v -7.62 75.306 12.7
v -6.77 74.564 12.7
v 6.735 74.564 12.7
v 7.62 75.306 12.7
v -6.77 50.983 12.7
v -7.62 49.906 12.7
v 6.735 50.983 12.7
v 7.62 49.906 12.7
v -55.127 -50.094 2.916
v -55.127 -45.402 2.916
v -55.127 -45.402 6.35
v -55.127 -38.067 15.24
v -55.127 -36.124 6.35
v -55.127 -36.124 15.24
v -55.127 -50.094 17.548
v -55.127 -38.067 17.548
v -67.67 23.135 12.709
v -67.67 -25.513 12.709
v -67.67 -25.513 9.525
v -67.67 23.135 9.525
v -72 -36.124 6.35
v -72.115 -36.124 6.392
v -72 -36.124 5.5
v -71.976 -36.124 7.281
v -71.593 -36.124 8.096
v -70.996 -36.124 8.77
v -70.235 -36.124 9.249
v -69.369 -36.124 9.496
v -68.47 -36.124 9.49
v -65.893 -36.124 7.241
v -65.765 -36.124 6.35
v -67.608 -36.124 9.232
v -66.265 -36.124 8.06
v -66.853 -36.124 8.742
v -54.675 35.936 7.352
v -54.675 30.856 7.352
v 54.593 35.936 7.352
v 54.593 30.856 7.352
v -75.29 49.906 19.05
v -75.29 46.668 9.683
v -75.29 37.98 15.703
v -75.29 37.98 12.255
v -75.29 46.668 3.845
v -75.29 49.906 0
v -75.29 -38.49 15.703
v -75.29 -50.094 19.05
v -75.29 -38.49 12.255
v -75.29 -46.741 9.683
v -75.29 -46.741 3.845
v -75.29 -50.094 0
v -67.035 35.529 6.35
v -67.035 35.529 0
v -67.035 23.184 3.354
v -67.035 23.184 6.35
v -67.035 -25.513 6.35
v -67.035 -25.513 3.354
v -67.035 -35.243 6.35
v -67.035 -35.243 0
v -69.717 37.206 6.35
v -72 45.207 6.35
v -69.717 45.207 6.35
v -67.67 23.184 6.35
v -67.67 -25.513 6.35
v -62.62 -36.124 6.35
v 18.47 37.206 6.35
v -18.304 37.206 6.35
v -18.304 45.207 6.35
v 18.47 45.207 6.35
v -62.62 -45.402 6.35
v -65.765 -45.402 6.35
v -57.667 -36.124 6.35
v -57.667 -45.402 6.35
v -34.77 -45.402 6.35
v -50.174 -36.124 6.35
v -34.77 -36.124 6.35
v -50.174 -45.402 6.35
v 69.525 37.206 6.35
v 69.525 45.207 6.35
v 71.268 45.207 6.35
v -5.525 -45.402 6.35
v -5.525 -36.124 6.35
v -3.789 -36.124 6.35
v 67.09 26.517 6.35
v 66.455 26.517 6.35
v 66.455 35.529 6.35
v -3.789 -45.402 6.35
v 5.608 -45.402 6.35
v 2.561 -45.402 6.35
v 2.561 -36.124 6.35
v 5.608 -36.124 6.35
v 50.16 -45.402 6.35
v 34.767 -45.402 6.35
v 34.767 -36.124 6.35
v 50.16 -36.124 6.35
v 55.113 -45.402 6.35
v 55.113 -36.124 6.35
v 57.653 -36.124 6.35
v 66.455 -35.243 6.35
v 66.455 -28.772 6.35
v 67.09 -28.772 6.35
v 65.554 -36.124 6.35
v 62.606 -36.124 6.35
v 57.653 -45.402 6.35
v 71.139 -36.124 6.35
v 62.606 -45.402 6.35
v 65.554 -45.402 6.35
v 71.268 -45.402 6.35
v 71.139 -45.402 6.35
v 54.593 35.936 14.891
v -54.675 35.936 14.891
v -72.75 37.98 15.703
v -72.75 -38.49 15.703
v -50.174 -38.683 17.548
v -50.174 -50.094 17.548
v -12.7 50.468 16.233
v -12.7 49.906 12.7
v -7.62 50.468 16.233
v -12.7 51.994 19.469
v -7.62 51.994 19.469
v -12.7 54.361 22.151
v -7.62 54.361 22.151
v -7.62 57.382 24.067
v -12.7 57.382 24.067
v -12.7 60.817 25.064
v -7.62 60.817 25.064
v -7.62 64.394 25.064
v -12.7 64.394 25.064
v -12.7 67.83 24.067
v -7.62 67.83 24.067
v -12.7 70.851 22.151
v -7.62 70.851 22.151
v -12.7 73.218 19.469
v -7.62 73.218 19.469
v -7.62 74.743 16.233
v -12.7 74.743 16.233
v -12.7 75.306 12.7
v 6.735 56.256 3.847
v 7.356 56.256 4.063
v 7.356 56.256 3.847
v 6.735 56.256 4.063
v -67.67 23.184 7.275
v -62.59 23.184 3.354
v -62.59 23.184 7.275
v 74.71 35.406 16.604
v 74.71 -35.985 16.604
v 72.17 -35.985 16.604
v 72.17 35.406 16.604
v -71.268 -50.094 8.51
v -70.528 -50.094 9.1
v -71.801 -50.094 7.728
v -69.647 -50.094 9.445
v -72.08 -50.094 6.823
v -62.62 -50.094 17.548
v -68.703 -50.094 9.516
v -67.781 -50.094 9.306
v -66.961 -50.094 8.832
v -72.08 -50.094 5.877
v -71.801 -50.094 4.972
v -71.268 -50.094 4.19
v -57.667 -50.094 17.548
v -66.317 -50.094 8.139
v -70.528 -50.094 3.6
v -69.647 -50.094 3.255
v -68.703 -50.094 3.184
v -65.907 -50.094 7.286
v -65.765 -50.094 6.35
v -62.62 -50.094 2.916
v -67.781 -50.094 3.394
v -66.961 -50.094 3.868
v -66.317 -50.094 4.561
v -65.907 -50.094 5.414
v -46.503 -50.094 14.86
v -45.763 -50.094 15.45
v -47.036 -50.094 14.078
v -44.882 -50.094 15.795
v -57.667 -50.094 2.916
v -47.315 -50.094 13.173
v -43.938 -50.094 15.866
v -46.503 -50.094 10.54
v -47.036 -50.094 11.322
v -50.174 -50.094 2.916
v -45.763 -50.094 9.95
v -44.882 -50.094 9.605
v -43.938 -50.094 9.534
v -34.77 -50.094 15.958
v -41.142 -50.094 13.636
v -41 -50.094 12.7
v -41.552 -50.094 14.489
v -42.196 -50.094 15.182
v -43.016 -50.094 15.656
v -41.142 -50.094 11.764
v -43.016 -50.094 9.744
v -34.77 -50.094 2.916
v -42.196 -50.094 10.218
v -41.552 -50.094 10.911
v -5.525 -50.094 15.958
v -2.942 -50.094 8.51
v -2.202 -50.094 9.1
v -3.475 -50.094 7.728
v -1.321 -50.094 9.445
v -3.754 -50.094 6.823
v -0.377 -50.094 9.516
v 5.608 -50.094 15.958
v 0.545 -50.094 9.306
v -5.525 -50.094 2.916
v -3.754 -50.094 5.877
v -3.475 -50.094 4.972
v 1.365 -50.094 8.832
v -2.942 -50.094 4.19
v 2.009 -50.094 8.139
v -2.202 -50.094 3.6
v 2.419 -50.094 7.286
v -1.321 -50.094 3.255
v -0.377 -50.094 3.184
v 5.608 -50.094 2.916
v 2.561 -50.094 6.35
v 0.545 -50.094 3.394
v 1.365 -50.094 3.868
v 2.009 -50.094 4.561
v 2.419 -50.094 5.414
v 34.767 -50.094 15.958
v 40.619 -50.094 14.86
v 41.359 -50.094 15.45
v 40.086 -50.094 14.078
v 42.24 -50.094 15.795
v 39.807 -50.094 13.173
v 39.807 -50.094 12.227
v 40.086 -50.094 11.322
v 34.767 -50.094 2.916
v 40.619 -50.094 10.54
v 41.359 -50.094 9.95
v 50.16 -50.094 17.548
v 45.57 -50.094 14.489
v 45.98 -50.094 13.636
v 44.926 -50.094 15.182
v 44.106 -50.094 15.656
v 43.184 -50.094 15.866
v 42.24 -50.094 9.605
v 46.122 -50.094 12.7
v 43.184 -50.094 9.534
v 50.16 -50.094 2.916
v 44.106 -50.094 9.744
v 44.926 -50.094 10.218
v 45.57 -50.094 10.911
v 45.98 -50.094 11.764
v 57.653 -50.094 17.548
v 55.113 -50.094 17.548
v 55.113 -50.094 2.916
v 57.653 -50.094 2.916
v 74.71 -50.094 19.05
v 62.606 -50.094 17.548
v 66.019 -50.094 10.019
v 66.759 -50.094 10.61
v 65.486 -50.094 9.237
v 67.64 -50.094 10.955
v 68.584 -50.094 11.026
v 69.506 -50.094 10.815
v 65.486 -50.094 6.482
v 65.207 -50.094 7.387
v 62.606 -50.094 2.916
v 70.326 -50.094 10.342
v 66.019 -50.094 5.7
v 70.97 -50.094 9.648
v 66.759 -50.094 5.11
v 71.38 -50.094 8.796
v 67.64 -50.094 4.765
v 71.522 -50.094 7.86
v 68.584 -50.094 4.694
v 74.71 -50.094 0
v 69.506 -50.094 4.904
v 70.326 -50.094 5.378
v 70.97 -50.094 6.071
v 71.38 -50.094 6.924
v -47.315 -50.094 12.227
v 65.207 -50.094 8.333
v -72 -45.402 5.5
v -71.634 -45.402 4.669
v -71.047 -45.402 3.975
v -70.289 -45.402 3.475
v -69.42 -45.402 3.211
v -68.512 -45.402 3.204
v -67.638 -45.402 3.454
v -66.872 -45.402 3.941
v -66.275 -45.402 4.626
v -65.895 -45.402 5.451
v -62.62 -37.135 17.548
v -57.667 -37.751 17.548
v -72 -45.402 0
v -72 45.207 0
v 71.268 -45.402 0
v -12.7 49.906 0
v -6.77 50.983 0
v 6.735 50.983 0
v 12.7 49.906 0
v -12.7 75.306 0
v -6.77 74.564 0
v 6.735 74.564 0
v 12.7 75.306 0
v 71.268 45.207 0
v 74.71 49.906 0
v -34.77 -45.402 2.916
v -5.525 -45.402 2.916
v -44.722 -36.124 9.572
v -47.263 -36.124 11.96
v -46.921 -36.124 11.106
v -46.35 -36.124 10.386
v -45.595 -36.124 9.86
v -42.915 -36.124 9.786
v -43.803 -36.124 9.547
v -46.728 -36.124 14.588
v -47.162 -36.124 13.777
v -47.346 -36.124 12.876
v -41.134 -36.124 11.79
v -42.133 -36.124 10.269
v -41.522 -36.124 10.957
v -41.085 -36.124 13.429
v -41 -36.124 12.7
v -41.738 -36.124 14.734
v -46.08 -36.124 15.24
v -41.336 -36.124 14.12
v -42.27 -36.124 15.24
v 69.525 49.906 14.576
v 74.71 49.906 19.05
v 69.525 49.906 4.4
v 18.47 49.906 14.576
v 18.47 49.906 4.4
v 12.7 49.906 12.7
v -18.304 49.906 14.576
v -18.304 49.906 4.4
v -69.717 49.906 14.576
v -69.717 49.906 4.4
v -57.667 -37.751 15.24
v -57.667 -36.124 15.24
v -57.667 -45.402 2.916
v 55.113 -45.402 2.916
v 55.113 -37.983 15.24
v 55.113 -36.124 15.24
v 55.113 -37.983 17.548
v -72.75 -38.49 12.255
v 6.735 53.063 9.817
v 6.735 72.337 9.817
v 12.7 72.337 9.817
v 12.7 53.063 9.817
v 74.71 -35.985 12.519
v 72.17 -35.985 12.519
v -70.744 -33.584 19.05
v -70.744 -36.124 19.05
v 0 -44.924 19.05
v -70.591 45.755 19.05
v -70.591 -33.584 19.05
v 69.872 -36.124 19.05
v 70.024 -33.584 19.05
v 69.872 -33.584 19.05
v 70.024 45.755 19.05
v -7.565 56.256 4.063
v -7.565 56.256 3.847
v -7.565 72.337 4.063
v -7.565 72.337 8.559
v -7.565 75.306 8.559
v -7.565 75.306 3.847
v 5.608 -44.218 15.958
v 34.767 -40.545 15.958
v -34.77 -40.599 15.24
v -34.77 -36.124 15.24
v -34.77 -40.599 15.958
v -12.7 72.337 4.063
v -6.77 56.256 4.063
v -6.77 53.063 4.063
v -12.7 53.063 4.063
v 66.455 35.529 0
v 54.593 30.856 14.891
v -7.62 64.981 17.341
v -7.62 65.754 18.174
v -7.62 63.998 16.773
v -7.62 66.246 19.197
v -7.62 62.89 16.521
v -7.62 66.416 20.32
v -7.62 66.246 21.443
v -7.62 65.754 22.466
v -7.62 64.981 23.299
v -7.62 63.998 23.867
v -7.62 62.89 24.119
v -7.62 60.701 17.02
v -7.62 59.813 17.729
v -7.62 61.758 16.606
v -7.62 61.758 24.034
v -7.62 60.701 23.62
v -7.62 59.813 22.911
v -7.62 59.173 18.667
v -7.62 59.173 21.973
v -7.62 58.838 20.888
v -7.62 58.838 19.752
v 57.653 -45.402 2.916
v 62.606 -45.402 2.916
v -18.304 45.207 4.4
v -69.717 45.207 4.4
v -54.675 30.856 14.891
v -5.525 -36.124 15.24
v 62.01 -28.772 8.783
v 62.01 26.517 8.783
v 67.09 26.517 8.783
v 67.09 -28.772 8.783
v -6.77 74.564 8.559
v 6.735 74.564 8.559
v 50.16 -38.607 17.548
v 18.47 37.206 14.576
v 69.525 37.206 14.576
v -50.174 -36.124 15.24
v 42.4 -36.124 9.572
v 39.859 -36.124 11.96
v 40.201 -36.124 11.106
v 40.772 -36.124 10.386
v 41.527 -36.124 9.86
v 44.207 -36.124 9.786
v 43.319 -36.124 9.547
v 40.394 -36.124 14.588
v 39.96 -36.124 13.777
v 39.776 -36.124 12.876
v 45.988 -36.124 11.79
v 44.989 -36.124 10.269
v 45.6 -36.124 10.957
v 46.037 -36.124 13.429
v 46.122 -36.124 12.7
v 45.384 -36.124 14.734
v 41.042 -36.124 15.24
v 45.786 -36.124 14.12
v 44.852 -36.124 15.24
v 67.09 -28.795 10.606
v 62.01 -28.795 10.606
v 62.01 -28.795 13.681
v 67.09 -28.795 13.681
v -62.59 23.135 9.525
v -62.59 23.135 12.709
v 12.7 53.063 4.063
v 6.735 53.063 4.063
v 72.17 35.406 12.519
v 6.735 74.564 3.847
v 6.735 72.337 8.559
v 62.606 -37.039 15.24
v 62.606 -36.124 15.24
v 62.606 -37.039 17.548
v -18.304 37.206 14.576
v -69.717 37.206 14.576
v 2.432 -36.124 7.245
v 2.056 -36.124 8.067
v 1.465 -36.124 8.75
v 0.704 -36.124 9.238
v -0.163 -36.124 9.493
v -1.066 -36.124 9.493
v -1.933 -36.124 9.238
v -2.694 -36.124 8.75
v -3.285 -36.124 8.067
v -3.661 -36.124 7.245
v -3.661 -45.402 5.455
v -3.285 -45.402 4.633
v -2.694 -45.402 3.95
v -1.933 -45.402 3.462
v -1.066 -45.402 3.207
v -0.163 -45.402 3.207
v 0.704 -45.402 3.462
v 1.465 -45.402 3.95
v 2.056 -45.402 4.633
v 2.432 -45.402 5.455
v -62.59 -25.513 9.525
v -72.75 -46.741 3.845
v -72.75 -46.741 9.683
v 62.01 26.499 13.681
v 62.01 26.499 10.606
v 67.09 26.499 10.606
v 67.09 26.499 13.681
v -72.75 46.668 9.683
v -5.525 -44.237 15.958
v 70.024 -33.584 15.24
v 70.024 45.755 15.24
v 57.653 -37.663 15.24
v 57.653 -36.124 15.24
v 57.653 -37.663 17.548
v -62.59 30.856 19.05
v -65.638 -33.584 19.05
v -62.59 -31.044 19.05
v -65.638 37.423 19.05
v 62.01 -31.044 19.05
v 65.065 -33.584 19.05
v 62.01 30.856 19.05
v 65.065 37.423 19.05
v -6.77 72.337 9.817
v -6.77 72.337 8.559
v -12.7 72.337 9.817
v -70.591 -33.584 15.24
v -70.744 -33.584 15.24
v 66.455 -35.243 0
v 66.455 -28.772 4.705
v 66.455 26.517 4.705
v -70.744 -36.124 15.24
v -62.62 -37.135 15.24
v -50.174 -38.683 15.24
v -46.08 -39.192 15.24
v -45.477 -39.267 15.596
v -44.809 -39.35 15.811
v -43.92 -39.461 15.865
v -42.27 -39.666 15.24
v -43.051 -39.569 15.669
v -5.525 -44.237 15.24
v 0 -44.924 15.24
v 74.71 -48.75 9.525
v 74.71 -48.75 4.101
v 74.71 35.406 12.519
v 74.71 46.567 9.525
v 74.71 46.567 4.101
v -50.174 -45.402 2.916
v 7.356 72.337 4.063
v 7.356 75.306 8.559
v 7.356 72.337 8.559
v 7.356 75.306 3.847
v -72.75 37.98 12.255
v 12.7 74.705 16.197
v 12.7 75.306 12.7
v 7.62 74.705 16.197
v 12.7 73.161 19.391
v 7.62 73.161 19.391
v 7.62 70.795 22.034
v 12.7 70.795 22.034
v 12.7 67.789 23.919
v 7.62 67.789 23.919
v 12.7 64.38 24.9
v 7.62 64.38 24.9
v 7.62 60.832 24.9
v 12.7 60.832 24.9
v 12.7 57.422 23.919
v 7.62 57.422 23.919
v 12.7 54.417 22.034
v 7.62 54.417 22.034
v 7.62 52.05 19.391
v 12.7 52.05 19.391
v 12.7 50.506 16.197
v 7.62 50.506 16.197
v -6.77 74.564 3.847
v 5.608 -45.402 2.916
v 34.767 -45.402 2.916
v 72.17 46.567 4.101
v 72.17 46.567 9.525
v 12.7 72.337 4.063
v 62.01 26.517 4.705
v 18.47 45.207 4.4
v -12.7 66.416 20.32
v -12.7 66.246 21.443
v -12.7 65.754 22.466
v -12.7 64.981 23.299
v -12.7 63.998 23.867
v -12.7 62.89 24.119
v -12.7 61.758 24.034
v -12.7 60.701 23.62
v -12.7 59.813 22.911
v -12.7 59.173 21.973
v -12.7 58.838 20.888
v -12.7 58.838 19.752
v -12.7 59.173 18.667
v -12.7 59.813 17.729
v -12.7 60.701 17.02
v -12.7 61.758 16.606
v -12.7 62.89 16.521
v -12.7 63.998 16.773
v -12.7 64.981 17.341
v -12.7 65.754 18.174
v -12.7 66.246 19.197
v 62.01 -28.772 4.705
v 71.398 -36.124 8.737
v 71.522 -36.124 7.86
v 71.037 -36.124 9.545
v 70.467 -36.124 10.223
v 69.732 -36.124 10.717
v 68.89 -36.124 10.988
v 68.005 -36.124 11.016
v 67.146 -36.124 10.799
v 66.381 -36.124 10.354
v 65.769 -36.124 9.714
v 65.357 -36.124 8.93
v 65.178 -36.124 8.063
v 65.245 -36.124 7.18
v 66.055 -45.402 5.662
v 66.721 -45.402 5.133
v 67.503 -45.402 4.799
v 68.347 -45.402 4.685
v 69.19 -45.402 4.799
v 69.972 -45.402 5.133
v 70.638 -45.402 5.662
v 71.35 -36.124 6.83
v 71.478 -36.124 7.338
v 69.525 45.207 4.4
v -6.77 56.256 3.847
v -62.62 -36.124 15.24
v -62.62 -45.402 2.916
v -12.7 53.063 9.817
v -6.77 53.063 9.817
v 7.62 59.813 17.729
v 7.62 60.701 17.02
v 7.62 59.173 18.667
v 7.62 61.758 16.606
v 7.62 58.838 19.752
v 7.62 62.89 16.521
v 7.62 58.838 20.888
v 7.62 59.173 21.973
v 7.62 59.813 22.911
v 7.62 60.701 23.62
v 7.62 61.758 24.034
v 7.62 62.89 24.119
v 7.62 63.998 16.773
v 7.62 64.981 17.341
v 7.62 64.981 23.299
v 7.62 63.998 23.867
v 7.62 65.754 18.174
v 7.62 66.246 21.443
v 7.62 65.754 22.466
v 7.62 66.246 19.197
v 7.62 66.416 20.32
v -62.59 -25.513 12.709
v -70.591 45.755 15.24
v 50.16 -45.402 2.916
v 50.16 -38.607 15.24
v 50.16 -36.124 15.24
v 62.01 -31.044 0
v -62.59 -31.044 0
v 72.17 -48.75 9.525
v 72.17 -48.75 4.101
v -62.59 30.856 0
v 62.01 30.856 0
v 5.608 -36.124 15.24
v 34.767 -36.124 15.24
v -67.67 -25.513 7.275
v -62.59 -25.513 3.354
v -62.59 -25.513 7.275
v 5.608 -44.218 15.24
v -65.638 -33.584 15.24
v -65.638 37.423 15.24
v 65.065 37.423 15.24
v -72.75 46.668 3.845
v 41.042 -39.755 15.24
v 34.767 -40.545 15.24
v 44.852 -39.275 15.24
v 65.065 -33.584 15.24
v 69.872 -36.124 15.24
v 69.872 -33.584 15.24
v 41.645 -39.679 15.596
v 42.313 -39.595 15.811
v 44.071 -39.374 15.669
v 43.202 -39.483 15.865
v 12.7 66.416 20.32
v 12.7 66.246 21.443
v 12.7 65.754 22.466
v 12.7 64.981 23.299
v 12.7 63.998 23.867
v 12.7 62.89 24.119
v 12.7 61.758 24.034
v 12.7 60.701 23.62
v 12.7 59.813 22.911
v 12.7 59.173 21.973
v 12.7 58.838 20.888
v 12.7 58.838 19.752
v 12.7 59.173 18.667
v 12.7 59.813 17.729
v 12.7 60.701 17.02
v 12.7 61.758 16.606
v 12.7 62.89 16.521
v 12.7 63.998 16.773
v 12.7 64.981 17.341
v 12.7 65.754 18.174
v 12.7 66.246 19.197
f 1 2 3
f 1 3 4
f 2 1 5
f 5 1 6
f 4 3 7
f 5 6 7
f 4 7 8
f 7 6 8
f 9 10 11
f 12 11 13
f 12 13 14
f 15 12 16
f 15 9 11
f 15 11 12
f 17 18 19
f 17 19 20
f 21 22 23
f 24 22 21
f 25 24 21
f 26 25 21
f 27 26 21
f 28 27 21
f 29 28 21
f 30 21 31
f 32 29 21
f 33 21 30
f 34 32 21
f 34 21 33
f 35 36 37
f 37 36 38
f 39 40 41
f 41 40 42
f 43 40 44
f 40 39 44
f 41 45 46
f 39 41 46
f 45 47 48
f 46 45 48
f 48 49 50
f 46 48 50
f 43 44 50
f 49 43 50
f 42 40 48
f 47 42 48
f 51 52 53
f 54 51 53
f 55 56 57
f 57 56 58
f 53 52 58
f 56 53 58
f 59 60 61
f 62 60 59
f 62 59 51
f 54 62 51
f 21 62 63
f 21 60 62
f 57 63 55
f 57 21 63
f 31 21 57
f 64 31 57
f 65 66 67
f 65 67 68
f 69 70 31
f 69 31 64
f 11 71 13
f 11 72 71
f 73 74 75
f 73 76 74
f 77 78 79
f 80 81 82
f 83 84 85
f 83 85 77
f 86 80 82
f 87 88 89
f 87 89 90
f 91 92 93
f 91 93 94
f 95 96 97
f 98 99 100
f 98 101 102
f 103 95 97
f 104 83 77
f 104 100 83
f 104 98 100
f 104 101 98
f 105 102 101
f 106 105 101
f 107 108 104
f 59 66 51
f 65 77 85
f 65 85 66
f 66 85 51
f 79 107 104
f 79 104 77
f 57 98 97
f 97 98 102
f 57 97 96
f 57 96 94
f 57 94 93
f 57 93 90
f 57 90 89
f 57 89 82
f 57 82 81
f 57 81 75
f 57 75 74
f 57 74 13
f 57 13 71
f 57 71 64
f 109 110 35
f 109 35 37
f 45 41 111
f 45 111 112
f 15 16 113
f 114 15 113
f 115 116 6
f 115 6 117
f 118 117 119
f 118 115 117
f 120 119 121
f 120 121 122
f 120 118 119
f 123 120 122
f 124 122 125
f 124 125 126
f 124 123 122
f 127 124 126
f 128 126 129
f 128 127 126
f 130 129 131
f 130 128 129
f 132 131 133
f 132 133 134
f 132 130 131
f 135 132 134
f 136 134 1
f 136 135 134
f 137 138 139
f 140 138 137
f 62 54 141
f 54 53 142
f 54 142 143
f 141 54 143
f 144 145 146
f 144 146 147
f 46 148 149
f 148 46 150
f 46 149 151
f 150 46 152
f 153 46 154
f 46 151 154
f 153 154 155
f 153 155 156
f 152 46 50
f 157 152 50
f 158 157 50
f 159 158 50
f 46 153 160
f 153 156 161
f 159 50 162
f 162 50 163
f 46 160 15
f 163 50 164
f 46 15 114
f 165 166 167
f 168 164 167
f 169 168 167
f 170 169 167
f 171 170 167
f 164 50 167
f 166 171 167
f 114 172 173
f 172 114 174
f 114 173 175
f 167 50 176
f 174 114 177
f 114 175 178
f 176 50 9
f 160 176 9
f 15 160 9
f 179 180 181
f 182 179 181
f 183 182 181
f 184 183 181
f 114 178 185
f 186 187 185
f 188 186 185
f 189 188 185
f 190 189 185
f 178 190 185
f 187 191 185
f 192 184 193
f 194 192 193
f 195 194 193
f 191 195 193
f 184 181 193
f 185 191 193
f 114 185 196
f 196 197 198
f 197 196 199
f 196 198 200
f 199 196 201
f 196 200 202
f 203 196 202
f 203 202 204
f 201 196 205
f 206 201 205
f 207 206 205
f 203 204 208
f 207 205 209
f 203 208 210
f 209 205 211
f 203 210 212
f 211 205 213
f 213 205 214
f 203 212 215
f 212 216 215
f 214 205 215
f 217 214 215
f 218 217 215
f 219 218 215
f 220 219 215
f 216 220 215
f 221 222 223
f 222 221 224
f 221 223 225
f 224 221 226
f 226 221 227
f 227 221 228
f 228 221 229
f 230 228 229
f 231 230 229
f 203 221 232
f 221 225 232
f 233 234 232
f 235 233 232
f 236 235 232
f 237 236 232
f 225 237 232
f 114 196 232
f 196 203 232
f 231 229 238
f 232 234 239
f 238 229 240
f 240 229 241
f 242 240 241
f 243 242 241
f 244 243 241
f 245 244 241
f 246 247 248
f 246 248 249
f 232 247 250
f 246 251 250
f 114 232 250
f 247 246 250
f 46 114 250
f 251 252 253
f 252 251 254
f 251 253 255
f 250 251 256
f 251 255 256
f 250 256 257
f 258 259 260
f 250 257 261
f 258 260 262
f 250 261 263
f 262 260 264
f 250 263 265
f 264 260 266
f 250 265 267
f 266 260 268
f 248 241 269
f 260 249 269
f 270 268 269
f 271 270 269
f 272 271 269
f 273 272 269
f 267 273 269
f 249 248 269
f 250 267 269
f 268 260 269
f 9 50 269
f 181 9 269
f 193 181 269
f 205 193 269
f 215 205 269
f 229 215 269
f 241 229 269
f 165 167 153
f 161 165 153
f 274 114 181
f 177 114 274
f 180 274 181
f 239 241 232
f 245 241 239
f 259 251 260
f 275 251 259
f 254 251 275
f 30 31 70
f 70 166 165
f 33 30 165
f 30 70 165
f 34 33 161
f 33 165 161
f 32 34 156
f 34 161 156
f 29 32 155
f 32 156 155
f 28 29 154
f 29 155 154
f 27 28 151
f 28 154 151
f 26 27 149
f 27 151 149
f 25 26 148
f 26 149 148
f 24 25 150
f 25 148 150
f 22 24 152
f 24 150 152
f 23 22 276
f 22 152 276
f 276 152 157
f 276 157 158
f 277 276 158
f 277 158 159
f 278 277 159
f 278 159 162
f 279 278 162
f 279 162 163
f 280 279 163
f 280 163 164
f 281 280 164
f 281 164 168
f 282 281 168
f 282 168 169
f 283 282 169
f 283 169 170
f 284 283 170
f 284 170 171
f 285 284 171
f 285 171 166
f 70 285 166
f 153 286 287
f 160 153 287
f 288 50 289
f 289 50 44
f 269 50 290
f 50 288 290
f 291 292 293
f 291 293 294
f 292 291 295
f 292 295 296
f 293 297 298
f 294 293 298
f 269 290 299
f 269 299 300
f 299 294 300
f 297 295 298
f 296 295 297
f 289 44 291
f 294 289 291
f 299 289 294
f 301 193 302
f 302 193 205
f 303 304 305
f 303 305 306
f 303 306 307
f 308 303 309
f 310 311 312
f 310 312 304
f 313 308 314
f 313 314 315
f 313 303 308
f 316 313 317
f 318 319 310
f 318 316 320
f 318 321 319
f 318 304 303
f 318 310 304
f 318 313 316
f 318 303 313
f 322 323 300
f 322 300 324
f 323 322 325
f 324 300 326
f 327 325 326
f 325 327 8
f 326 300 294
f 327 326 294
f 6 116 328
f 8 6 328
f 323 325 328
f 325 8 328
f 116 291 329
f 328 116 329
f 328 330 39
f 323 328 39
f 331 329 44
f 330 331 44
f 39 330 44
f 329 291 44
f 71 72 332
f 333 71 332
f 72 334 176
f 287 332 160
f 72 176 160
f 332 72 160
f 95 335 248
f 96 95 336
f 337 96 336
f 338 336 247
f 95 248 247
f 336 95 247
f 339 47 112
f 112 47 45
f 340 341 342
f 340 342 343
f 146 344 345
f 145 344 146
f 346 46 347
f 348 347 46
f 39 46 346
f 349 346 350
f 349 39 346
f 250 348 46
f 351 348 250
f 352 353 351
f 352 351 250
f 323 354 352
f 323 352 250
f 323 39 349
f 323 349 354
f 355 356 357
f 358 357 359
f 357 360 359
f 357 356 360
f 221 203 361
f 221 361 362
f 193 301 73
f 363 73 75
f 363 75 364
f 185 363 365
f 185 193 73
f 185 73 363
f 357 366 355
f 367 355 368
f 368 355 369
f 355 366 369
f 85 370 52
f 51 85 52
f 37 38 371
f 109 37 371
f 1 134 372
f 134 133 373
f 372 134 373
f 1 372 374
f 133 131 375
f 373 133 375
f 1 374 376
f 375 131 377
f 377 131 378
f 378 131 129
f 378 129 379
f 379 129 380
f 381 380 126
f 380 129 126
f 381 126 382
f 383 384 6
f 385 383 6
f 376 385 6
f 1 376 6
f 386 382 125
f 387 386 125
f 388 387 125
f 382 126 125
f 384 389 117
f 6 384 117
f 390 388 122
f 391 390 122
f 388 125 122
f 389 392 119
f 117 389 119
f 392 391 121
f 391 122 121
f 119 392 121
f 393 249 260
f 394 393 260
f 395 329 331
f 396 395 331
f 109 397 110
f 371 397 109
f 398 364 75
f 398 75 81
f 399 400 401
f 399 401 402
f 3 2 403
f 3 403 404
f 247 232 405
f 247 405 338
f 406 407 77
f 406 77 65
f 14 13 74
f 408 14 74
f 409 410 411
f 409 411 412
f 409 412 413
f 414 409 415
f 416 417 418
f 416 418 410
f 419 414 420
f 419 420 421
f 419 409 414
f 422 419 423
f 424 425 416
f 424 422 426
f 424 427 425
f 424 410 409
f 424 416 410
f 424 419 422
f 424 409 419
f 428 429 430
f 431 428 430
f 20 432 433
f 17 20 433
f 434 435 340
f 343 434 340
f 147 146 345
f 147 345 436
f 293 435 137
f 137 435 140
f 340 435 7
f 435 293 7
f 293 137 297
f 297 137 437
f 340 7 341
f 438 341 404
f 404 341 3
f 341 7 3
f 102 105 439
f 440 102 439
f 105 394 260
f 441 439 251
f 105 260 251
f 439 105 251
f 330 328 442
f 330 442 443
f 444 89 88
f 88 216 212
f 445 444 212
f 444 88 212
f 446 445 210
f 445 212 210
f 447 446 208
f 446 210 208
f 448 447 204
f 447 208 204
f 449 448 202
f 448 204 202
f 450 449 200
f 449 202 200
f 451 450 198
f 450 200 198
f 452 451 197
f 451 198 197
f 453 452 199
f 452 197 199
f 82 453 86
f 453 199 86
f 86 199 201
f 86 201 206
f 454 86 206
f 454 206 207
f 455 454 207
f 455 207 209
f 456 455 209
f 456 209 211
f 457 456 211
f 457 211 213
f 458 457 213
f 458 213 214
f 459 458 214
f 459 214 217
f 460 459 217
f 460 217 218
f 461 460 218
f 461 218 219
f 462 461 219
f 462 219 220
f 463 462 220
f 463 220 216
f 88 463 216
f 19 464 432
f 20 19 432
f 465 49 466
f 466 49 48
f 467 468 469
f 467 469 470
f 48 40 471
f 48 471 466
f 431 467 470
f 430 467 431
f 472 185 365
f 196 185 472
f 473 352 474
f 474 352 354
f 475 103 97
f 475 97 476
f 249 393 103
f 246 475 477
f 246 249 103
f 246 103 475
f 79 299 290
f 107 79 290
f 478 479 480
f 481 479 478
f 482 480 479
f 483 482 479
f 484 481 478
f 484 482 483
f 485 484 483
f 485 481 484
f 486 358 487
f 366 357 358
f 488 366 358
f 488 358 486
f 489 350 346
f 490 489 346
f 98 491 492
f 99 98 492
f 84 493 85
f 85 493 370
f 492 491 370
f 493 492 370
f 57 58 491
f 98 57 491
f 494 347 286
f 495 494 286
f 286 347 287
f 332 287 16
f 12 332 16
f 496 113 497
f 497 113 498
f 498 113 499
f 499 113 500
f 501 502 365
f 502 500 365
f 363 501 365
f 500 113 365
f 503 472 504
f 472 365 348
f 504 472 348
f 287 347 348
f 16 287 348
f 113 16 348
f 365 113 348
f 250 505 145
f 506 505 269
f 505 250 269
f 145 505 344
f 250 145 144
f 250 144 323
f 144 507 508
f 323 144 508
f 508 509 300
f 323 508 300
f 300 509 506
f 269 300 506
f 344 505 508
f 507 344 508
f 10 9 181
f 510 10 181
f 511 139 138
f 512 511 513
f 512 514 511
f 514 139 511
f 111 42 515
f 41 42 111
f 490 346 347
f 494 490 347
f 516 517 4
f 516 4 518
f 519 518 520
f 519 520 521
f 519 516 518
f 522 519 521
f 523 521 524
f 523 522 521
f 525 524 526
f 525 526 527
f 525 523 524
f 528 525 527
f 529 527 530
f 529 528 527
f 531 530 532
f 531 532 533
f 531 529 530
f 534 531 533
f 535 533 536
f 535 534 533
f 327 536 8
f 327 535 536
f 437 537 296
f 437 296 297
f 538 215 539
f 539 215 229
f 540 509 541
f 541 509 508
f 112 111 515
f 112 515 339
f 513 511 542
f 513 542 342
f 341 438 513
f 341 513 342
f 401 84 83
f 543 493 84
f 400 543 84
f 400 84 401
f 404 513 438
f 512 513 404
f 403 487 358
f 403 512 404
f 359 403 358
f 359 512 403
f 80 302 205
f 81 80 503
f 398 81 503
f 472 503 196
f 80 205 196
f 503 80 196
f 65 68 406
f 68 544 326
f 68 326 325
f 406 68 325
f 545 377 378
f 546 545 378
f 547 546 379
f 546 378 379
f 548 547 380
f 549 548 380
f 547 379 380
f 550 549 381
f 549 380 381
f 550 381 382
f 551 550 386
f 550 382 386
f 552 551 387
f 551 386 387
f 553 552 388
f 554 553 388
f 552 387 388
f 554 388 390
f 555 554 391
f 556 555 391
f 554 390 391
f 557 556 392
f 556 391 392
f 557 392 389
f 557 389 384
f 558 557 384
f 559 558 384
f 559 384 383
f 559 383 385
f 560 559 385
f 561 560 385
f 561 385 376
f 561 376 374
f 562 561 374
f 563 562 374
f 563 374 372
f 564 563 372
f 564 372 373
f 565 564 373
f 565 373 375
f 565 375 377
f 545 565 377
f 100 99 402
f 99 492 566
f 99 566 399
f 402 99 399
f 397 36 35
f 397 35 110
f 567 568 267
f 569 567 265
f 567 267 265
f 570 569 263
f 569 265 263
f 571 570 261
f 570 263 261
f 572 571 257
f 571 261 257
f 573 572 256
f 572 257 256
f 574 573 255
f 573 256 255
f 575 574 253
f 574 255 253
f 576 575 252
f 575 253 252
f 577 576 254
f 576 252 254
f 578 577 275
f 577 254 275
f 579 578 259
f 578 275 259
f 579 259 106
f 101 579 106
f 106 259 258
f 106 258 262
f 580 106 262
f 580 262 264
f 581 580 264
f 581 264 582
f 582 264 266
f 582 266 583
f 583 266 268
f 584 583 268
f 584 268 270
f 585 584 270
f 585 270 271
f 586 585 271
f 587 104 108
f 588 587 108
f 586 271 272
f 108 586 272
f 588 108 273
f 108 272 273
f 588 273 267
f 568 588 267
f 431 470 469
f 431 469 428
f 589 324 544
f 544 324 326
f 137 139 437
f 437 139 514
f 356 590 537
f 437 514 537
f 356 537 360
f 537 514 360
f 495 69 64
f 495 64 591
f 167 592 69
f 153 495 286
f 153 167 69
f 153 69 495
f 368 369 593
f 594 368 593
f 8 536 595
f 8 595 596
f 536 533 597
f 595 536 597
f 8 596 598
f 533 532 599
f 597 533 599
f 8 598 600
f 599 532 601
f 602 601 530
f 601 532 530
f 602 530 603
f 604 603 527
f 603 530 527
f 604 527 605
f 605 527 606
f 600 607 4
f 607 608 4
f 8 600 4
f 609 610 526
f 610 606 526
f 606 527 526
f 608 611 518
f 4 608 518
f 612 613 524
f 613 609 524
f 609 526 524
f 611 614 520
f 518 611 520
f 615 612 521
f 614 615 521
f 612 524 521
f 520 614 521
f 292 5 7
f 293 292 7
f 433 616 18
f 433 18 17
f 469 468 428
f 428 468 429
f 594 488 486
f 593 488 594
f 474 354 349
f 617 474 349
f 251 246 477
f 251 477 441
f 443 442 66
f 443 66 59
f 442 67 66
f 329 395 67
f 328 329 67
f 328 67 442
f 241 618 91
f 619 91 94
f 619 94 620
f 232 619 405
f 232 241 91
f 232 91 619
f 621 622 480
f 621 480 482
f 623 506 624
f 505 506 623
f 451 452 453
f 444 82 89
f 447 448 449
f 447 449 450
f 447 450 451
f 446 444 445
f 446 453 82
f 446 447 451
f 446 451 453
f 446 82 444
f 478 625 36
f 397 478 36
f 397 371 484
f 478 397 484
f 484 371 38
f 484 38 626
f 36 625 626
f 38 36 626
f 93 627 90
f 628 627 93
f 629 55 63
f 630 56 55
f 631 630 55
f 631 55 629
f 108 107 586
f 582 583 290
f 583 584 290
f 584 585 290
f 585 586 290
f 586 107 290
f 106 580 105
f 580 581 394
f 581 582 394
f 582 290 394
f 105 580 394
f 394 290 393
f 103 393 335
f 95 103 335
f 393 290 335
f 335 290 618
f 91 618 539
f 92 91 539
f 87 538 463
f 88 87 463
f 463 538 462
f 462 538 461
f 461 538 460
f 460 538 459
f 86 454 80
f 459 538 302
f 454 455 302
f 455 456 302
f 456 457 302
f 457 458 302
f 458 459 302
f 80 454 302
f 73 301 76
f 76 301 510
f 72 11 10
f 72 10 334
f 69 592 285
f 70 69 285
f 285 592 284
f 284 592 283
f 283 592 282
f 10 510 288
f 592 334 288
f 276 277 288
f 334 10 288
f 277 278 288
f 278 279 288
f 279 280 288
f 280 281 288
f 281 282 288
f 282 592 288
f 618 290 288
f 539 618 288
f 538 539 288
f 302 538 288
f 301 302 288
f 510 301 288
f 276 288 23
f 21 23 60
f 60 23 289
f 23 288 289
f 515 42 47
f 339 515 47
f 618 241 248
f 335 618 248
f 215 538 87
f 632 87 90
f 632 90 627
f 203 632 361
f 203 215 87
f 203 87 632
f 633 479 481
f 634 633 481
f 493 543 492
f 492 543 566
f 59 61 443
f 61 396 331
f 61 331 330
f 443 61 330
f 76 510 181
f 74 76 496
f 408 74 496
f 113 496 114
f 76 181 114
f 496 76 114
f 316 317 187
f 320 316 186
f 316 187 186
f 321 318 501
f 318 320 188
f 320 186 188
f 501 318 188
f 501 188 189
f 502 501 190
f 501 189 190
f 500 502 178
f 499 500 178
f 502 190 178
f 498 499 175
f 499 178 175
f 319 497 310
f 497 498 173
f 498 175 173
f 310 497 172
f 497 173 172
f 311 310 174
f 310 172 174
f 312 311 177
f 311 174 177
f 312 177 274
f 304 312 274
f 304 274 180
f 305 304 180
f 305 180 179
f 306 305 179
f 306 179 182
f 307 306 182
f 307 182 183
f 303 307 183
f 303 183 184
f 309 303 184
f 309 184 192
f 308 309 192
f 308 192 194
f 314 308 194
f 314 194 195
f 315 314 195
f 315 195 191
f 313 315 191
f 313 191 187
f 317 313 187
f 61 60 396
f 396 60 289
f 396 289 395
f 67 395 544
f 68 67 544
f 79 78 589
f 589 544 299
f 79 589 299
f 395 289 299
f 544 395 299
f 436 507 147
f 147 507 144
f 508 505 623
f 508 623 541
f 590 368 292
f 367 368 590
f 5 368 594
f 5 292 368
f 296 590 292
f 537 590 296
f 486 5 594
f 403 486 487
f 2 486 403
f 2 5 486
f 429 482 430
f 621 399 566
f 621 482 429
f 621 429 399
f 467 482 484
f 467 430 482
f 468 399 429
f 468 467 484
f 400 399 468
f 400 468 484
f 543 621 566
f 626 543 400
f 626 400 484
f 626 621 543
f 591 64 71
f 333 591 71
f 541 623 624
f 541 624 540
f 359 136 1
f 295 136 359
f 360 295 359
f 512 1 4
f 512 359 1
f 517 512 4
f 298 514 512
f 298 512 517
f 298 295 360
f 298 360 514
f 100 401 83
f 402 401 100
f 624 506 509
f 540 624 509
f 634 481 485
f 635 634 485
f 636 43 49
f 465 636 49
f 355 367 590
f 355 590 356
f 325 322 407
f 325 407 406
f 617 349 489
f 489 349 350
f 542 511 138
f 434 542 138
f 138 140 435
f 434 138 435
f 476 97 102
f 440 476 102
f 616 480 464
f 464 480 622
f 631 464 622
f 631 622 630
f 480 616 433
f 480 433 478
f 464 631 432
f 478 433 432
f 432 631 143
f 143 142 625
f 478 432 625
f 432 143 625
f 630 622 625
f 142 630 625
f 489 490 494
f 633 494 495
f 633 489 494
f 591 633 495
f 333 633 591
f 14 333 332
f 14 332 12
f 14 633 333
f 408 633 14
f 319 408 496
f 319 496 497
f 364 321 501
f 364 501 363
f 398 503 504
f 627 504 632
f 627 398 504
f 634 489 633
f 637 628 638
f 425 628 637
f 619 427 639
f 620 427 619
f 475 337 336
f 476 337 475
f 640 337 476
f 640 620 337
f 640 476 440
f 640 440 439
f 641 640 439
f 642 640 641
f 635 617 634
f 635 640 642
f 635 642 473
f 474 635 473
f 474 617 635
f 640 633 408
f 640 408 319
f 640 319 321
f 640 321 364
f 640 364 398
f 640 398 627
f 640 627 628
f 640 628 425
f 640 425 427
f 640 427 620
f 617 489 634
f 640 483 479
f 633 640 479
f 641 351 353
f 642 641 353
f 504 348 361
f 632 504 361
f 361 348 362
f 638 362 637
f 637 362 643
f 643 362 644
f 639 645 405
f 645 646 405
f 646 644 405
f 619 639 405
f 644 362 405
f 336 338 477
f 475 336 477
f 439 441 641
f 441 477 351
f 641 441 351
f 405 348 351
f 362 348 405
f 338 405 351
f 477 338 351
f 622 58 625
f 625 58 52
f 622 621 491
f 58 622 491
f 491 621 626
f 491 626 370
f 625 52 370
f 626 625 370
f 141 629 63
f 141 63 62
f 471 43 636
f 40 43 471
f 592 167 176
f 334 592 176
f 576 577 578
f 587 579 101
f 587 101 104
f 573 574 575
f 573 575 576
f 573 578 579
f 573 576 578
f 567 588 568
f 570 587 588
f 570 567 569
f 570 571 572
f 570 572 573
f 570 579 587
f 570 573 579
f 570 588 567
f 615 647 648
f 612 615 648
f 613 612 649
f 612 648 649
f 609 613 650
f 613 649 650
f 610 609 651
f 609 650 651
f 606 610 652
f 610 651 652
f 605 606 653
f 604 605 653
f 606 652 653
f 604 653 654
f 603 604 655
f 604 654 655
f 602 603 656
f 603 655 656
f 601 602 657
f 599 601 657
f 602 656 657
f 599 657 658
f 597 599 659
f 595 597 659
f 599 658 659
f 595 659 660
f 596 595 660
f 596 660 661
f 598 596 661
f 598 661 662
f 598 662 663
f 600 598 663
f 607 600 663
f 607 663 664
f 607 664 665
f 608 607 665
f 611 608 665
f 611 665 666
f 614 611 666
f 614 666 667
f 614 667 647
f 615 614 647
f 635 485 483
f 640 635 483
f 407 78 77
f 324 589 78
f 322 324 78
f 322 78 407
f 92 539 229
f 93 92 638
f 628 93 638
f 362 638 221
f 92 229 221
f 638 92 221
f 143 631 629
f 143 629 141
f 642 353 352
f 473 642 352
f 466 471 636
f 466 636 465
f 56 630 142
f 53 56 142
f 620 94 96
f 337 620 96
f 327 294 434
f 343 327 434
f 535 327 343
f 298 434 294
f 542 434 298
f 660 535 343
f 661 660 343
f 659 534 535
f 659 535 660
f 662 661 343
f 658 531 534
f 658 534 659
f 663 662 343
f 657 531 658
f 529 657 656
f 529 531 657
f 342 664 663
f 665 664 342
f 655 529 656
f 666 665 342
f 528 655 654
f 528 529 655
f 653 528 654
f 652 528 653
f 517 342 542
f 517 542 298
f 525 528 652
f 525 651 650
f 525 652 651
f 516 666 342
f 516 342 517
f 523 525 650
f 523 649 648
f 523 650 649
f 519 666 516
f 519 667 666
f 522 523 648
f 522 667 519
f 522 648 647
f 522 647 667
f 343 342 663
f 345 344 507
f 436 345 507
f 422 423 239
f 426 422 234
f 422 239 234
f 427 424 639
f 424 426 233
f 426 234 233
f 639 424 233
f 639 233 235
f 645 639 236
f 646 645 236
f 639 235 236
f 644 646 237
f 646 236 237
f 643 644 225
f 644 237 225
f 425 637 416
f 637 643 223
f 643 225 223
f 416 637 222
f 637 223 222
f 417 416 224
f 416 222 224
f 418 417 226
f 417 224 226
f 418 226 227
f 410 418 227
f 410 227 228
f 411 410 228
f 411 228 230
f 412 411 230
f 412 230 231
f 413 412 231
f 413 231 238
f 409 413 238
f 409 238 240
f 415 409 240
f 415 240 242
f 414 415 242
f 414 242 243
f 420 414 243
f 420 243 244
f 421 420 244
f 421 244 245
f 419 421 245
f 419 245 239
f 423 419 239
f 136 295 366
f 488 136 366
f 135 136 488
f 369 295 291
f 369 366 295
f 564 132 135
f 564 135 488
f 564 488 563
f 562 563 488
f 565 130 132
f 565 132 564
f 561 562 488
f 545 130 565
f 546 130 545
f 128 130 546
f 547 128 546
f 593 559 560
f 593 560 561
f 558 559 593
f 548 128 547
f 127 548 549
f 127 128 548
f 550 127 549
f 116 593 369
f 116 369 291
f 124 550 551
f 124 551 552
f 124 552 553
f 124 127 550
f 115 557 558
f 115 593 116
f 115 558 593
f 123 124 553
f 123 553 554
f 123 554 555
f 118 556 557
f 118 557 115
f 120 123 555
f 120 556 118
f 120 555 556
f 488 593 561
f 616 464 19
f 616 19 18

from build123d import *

# Parameters (mm, degrees)
F0_W      = 124.6
F0_H      = 61.9
F1_DEPTH  = 19.05
F2_W      = 4.953
F2_H      = 14.6315630991
F2_W_2    = 29.2449435338
F2_H_2    = 13.041177066
F2_W_3    = 29.159436468
F2_R      = 3.175
F3_DEPTH  = 13.97
F5_DEPTH  = 6.35
F6_W      = 12.7
F6_H      = 25.4
F7_DEPTH  = 12.7
F8_W      = 4.953
F8_H      = 71.0073517896
F9_DEPTH  = 3.81
F10_R     = 3.81
F11_DEPTH = 5.08
F13_DEPTH = 5.08
F14_DEPTH = 31.75
F16_W     = 13.5046280921
F16_H     = 23.5811583698
F17_DEPTH = 25.4
F18_W     = 19.2745104432
F18_H     = 5.7546193711
F19_DEPTH = 31.75
F20_W     = 14.9206416681
F20_H     = 4.7117811628
F21_DEPTH = 19.05
F22_W     = 51.0552711785
F22_H     = 10.1753515191
F22_W_2   = 51.412301138
F23_DEPTH = 12.7
F24_W     = 93.4092327952
F24_H     = 5.8380772825
F24_W_2   = 76.4692127705
F24_H_2   = 3.4473836422
F25_DEPTH = 2.54
F26_W     = 95.3170992434
F26_H     = 5.4240481682
F26_W_2   = 71.3913366199
F26_H_2   = 4.0845796466
F27_DEPTH = 2.54
F28_W     = 109.2679016292
F28_H     = 7.5388159603
F29_DEPTH = 5.08
F30_W     = 48.6481711268
F30_H     = 3.1835205168
F30_W_2   = 48.6969016492
F30_H_2   = 3.9205837529
F31_DEPTH = 5.08
F32_W     = 55.2894864231
F32_H     = 4.0775961243
F32_W_2   = 55.2933309227
F32_H_2   = 3.075633198
F33_DEPTH = 5.08


# Not quite as in the source:
# - a feature names something its author has since deleted; it is built from what else it names


with BuildPart() as f1:
    # F0 (on Top) → F1 (new body)
    with BuildSketch(Plane.XY):
        Polygon((-75.2904937168, 49.9057597088), (-75.2904937168, -50.0942402912), (-42.6597435957, -50.0942402912), (67.6151300783, -50.0942402912), (74.7095062832, -50.0942402912), (74.7095062832, 49.9057597088), (-0.2904937168, 49.9057597088), (-25.810170721, 49.9057597088), (-50.4447113996, 49.9057597088), align=None)
        with Locations((-0.2904937168, -0.0942402912)):
            Rectangle(F0_W, F0_H, mode=Mode.SUBTRACT)
    extrude(amount=F1_DEPTH)

    # F2 (on face) → F3 (cut)
    with BuildSketch(Plane.XZ.offset(50.0942402912)):
        with Locations((-60.1431414232, 10.2322226157)):
            Rectangle(F2_W, F2_H)
        with Locations((-52.6501414232, 10.2322226157)):
            Rectangle(F2_W, F2_H)
        with Locations((-20.147212787, 9.4370295992)):
            Rectangle(F2_W_2, F2_H_2)
        with Locations((20.1876896899, 9.4370295992)):
            Rectangle(F2_W_3, F2_H_2)
        with Locations((52.6363079239, 10.2322226157)):
            Rectangle(F2_W, F2_H)
        with Locations((60.1293079239, 10.2322226157)):
            Rectangle(F2_W, F2_H)
        with Locations((-44.1754937168, 12.7)):
            Circle(F2_R)
        with Locations((-0.6144937168, 6.35)):
            Circle(F2_R)
        with Locations((42.9465062832, 12.7)):
            Circle(F2_R)
        with Locations((68.3465062832, 7.8599134153)):
            Circle(F2_R)
        with Locations((-68.9404937168, 6.35)):
            Circle(F2_R)
    extrude(amount=-F3_DEPTH, mode=Mode.SUBTRACT)

    # F4 (on face) → F5 (cut)
    with BuildSketch(Plane(origin=(0, 0, 0), x_dir=(1, 0, 0), z_dir=(0, 0, -1))):
        Polygon((66.3145062832, 45.4020188174), (-67.0354937168, 45.4020188174), (-67.0354937168, 35.2429834301), (-61.1156715149, 35.2429834301), (60.9613691041, 35.2429834301), (66.3145062832, 35.2429834301), align=None)
        Polygon((-67.0354937168, 35.2429834301), (-67.0354937168, 45.4020188174), (-71.9995722175, 45.4020188174), (-71.9995722175, -45.2067597088), (-67.0354937168, -45.2067597088), (-67.0354937168, -35.52858904), align=None)
        Polygon((71.2675062832, 45.4020188174), (66.3145062832, 45.4020188174), (66.3145062832, 35.2429834301), (66.4545062832, 35.2429834301), (66.4545062832, -35.52858904), (66.4545062832, -45.2067597088), (71.2675062832, -45.2067597088), align=None)
        Polygon((60.9613691041, -35.52858904), (-67.0354937168, -35.52858904), (-67.0354937168, -45.2067597088), (66.4545062832, -45.2067597088), (66.4545062832, -35.52858904), align=None)
    extrude(amount=-F5_DEPTH, mode=Mode.SUBTRACT)

    # F6 (on face) → F7 (join)
    with BuildSketch(Plane(origin=(0, 0, 0), x_dir=(1, 0, 0), z_dir=(0, 0, -1))):
        with Locations((6.35, -62.6057597088)):
            Rectangle(F6_W, F6_H)
        with Locations((-6.35, -62.6057597088)):
            Rectangle(F6_W, F6_H)
    extrude(amount=-F7_DEPTH)

    # F8 (on face) → F9 (cut)
    with BuildSketch(Plane.XY.offset(19.05)):
        Polygon((70.0243711472, 45.754622668), (-70.5914937168, 45.754622668), (-70.5914937168, 37.4231114984), (-65.6384937168, 37.4231114984), (65.065138042, 37.4231114984), (70.0243711472, 37.4231114984), align=None)
        with Locations((-68.1149937168, 1.9194356036)):
            Rectangle(F8_W, F8_H)
        Polygon((70.0243711472, -33.5842402912), (70.0243711472, 37.4231114984), (65.065138042, 37.4231114984), (65.065138042, -33.5842402912), (69.871573916, -33.5842402912), align=None)
        Polygon((-65.6384937168, -33.5842402912), (-70.5914937168, -33.5842402912), (-70.7442909479, -33.5842402912), (-70.7442909479, -36.1242402912), (69.871573916, -36.1242402912), (69.871573916, -33.5842402912), (65.065138042, -33.5842402912), align=None)
        Polygon((69.871573916, -36.1242402912), (-70.7442909479, -36.1242402912), (0, -44.9241176248), align=None)
    extrude(amount=-F9_DEPTH, mode=Mode.SUBTRACT)

    # F10 (on face) → F11 (join)
    with BuildSketch(Plane.YZ.offset(12.7)):
        with BuildLine():
            Line((49.9057597088, 12.7), (75.3057597088, 12.7))
            ThreePointArc((75.3057597088, 12.7), (62.6057597088, 25.0247137147), (49.9057597088, 12.7))
        make_face()
        with Locations((62.6057597088, 20.32)):
            Circle(F10_R, mode=Mode.SUBTRACT)
        with Locations((62.6057597088, 20.32)):
            Circle(F10_R)
    extrude(amount=-F11_DEPTH)

    # F12 (on face) → F13 (join)
    with BuildSketch(Plane(origin=(-12.7, 0, 0), x_dir=(0, -1, 0), z_dir=(-1, 0, 0))):
        with BuildLine():
            Line((-75.3057597088, 12.7), (-49.9057597088, 12.7))
            ThreePointArc((-49.9057597088, 12.7), (-62.6057597088, 25.1906117041), (-75.3057597088, 12.7))
        make_face()
    extrude(amount=-F13_DEPTH)

    # F10 (on face) → F14 (cut)
    with BuildSketch(Plane.YZ.offset(12.7)):
        with Locations((62.6057597088, 20.32)):
            Circle(F10_R)
    extrude(amount=-F14_DEPTH, mode=Mode.SUBTRACT)

    # F16 (on face) → F17 (cut)
    with BuildSketch(Plane.XY.offset(12.7)):
        with Locations((-0.017571263, 62.7732072026)):
            Rectangle(F16_W, F16_H)
    extrude(amount=-F17_DEPTH, mode=Mode.SUBTRACT)

    # F18 (on face) → F19 (cut)
    with BuildSketch(Plane(origin=(-12.7, 0, 0), x_dir=(0, -1, 0), z_dir=(-1, 0, 0))):
        with Locations((-62.7002157271, 6.9401275832)):
            Rectangle(F18_W, F18_H)
    extrude(amount=-F19_DEPTH, mode=Mode.SUBTRACT)

    # F20 (on face) → F21 (cut)
    with BuildSketch(Plane(origin=(0, 75.3057597088, 0), x_dir=(-1, 0, 0), z_dir=(0, 1, 0))):
        with Locations((0.1047314145, 6.2031324487)):
            Rectangle(F20_W, F20_H)
    extrude(amount=-F21_DEPTH, mode=Mode.SUBTRACT)

    # F22 (on face) → F23 (cut)
    with BuildSketch(Plane(origin=(0, 49.9057597088, 0), x_dir=(-1, 0, 0), z_dir=(0, 1, 0))):
        with Locations((-43.9973082393, 9.4878289383)):
            Rectangle(F22_W, F22_H)
        with Locations((44.010556303, 9.4878289383)):
            Rectangle(F22_W_2, F22_H)
    extrude(amount=-F23_DEPTH, mode=Mode.SUBTRACT)

    # F24 (on face) → F25 (cut)
    with BuildSketch(Plane(origin=(-75.2904937168, 0, 0), x_dir=(0, -1, 0), z_dir=(-1, 0, 0))):
        with Locations((0.03618747, 6.7635682644)):
            Rectangle(F24_W, F24_H)
        with Locations((0.2549141645, 13.9791369438)):
            Rectangle(F24_W_2, F24_H_2)
    extrude(amount=-F25_DEPTH, mode=Mode.SUBTRACT)

    # F26 (on face) → F27 (cut)
    with BuildSketch(Plane.YZ.offset(74.7095062832)):
        with Locations((-1.0910946876, 6.8129759159)):
            Rectangle(F26_W, F26_H)
        with Locations((-0.289645046, 14.5612489432)):
            Rectangle(F26_W_2, F26_H_2)
    extrude(amount=-F27_DEPTH, mode=Mode.SUBTRACT)

    # F28 (on face) → F29 (cut)
    with BuildSketch(Plane.XZ.offset(-30.8557597088)):
        with Locations((-0.0406969339, 11.1216651276)):
            Rectangle(F28_W, F28_H)
    extrude(amount=-F29_DEPTH, mode=Mode.SUBTRACT)

    # F30 (on face) → F31 (cut)
    with BuildSketch(Plane.YZ.offset(-62.5904937168)):
        with Locations((-1.1887364089, 11.1167602584)):
            Rectangle(F30_W, F30_H)
        with Locations((-1.1643711478, 5.3142114775)):
            Rectangle(F30_W_2, F30_H_2)
    extrude(amount=-F31_DEPTH, mode=Mode.SUBTRACT)

    # F32 (on face) → F33 (cut)
    with BuildSketch(Plane(origin=(62.0095062832, 0, 0), x_dir=(0, -1, 0), z_dir=(-1, 0, 0))):
        with Locations((1.1272905394, 6.7439966369)):
            Rectangle(F32_W, F32_H)
        with Locations((1.1480180547, 12.1434889734)):
            Rectangle(F32_W_2, F32_H_2)
    extrude(amount=-F33_DEPTH, mode=Mode.SUBTRACT)


solid = f1.part
